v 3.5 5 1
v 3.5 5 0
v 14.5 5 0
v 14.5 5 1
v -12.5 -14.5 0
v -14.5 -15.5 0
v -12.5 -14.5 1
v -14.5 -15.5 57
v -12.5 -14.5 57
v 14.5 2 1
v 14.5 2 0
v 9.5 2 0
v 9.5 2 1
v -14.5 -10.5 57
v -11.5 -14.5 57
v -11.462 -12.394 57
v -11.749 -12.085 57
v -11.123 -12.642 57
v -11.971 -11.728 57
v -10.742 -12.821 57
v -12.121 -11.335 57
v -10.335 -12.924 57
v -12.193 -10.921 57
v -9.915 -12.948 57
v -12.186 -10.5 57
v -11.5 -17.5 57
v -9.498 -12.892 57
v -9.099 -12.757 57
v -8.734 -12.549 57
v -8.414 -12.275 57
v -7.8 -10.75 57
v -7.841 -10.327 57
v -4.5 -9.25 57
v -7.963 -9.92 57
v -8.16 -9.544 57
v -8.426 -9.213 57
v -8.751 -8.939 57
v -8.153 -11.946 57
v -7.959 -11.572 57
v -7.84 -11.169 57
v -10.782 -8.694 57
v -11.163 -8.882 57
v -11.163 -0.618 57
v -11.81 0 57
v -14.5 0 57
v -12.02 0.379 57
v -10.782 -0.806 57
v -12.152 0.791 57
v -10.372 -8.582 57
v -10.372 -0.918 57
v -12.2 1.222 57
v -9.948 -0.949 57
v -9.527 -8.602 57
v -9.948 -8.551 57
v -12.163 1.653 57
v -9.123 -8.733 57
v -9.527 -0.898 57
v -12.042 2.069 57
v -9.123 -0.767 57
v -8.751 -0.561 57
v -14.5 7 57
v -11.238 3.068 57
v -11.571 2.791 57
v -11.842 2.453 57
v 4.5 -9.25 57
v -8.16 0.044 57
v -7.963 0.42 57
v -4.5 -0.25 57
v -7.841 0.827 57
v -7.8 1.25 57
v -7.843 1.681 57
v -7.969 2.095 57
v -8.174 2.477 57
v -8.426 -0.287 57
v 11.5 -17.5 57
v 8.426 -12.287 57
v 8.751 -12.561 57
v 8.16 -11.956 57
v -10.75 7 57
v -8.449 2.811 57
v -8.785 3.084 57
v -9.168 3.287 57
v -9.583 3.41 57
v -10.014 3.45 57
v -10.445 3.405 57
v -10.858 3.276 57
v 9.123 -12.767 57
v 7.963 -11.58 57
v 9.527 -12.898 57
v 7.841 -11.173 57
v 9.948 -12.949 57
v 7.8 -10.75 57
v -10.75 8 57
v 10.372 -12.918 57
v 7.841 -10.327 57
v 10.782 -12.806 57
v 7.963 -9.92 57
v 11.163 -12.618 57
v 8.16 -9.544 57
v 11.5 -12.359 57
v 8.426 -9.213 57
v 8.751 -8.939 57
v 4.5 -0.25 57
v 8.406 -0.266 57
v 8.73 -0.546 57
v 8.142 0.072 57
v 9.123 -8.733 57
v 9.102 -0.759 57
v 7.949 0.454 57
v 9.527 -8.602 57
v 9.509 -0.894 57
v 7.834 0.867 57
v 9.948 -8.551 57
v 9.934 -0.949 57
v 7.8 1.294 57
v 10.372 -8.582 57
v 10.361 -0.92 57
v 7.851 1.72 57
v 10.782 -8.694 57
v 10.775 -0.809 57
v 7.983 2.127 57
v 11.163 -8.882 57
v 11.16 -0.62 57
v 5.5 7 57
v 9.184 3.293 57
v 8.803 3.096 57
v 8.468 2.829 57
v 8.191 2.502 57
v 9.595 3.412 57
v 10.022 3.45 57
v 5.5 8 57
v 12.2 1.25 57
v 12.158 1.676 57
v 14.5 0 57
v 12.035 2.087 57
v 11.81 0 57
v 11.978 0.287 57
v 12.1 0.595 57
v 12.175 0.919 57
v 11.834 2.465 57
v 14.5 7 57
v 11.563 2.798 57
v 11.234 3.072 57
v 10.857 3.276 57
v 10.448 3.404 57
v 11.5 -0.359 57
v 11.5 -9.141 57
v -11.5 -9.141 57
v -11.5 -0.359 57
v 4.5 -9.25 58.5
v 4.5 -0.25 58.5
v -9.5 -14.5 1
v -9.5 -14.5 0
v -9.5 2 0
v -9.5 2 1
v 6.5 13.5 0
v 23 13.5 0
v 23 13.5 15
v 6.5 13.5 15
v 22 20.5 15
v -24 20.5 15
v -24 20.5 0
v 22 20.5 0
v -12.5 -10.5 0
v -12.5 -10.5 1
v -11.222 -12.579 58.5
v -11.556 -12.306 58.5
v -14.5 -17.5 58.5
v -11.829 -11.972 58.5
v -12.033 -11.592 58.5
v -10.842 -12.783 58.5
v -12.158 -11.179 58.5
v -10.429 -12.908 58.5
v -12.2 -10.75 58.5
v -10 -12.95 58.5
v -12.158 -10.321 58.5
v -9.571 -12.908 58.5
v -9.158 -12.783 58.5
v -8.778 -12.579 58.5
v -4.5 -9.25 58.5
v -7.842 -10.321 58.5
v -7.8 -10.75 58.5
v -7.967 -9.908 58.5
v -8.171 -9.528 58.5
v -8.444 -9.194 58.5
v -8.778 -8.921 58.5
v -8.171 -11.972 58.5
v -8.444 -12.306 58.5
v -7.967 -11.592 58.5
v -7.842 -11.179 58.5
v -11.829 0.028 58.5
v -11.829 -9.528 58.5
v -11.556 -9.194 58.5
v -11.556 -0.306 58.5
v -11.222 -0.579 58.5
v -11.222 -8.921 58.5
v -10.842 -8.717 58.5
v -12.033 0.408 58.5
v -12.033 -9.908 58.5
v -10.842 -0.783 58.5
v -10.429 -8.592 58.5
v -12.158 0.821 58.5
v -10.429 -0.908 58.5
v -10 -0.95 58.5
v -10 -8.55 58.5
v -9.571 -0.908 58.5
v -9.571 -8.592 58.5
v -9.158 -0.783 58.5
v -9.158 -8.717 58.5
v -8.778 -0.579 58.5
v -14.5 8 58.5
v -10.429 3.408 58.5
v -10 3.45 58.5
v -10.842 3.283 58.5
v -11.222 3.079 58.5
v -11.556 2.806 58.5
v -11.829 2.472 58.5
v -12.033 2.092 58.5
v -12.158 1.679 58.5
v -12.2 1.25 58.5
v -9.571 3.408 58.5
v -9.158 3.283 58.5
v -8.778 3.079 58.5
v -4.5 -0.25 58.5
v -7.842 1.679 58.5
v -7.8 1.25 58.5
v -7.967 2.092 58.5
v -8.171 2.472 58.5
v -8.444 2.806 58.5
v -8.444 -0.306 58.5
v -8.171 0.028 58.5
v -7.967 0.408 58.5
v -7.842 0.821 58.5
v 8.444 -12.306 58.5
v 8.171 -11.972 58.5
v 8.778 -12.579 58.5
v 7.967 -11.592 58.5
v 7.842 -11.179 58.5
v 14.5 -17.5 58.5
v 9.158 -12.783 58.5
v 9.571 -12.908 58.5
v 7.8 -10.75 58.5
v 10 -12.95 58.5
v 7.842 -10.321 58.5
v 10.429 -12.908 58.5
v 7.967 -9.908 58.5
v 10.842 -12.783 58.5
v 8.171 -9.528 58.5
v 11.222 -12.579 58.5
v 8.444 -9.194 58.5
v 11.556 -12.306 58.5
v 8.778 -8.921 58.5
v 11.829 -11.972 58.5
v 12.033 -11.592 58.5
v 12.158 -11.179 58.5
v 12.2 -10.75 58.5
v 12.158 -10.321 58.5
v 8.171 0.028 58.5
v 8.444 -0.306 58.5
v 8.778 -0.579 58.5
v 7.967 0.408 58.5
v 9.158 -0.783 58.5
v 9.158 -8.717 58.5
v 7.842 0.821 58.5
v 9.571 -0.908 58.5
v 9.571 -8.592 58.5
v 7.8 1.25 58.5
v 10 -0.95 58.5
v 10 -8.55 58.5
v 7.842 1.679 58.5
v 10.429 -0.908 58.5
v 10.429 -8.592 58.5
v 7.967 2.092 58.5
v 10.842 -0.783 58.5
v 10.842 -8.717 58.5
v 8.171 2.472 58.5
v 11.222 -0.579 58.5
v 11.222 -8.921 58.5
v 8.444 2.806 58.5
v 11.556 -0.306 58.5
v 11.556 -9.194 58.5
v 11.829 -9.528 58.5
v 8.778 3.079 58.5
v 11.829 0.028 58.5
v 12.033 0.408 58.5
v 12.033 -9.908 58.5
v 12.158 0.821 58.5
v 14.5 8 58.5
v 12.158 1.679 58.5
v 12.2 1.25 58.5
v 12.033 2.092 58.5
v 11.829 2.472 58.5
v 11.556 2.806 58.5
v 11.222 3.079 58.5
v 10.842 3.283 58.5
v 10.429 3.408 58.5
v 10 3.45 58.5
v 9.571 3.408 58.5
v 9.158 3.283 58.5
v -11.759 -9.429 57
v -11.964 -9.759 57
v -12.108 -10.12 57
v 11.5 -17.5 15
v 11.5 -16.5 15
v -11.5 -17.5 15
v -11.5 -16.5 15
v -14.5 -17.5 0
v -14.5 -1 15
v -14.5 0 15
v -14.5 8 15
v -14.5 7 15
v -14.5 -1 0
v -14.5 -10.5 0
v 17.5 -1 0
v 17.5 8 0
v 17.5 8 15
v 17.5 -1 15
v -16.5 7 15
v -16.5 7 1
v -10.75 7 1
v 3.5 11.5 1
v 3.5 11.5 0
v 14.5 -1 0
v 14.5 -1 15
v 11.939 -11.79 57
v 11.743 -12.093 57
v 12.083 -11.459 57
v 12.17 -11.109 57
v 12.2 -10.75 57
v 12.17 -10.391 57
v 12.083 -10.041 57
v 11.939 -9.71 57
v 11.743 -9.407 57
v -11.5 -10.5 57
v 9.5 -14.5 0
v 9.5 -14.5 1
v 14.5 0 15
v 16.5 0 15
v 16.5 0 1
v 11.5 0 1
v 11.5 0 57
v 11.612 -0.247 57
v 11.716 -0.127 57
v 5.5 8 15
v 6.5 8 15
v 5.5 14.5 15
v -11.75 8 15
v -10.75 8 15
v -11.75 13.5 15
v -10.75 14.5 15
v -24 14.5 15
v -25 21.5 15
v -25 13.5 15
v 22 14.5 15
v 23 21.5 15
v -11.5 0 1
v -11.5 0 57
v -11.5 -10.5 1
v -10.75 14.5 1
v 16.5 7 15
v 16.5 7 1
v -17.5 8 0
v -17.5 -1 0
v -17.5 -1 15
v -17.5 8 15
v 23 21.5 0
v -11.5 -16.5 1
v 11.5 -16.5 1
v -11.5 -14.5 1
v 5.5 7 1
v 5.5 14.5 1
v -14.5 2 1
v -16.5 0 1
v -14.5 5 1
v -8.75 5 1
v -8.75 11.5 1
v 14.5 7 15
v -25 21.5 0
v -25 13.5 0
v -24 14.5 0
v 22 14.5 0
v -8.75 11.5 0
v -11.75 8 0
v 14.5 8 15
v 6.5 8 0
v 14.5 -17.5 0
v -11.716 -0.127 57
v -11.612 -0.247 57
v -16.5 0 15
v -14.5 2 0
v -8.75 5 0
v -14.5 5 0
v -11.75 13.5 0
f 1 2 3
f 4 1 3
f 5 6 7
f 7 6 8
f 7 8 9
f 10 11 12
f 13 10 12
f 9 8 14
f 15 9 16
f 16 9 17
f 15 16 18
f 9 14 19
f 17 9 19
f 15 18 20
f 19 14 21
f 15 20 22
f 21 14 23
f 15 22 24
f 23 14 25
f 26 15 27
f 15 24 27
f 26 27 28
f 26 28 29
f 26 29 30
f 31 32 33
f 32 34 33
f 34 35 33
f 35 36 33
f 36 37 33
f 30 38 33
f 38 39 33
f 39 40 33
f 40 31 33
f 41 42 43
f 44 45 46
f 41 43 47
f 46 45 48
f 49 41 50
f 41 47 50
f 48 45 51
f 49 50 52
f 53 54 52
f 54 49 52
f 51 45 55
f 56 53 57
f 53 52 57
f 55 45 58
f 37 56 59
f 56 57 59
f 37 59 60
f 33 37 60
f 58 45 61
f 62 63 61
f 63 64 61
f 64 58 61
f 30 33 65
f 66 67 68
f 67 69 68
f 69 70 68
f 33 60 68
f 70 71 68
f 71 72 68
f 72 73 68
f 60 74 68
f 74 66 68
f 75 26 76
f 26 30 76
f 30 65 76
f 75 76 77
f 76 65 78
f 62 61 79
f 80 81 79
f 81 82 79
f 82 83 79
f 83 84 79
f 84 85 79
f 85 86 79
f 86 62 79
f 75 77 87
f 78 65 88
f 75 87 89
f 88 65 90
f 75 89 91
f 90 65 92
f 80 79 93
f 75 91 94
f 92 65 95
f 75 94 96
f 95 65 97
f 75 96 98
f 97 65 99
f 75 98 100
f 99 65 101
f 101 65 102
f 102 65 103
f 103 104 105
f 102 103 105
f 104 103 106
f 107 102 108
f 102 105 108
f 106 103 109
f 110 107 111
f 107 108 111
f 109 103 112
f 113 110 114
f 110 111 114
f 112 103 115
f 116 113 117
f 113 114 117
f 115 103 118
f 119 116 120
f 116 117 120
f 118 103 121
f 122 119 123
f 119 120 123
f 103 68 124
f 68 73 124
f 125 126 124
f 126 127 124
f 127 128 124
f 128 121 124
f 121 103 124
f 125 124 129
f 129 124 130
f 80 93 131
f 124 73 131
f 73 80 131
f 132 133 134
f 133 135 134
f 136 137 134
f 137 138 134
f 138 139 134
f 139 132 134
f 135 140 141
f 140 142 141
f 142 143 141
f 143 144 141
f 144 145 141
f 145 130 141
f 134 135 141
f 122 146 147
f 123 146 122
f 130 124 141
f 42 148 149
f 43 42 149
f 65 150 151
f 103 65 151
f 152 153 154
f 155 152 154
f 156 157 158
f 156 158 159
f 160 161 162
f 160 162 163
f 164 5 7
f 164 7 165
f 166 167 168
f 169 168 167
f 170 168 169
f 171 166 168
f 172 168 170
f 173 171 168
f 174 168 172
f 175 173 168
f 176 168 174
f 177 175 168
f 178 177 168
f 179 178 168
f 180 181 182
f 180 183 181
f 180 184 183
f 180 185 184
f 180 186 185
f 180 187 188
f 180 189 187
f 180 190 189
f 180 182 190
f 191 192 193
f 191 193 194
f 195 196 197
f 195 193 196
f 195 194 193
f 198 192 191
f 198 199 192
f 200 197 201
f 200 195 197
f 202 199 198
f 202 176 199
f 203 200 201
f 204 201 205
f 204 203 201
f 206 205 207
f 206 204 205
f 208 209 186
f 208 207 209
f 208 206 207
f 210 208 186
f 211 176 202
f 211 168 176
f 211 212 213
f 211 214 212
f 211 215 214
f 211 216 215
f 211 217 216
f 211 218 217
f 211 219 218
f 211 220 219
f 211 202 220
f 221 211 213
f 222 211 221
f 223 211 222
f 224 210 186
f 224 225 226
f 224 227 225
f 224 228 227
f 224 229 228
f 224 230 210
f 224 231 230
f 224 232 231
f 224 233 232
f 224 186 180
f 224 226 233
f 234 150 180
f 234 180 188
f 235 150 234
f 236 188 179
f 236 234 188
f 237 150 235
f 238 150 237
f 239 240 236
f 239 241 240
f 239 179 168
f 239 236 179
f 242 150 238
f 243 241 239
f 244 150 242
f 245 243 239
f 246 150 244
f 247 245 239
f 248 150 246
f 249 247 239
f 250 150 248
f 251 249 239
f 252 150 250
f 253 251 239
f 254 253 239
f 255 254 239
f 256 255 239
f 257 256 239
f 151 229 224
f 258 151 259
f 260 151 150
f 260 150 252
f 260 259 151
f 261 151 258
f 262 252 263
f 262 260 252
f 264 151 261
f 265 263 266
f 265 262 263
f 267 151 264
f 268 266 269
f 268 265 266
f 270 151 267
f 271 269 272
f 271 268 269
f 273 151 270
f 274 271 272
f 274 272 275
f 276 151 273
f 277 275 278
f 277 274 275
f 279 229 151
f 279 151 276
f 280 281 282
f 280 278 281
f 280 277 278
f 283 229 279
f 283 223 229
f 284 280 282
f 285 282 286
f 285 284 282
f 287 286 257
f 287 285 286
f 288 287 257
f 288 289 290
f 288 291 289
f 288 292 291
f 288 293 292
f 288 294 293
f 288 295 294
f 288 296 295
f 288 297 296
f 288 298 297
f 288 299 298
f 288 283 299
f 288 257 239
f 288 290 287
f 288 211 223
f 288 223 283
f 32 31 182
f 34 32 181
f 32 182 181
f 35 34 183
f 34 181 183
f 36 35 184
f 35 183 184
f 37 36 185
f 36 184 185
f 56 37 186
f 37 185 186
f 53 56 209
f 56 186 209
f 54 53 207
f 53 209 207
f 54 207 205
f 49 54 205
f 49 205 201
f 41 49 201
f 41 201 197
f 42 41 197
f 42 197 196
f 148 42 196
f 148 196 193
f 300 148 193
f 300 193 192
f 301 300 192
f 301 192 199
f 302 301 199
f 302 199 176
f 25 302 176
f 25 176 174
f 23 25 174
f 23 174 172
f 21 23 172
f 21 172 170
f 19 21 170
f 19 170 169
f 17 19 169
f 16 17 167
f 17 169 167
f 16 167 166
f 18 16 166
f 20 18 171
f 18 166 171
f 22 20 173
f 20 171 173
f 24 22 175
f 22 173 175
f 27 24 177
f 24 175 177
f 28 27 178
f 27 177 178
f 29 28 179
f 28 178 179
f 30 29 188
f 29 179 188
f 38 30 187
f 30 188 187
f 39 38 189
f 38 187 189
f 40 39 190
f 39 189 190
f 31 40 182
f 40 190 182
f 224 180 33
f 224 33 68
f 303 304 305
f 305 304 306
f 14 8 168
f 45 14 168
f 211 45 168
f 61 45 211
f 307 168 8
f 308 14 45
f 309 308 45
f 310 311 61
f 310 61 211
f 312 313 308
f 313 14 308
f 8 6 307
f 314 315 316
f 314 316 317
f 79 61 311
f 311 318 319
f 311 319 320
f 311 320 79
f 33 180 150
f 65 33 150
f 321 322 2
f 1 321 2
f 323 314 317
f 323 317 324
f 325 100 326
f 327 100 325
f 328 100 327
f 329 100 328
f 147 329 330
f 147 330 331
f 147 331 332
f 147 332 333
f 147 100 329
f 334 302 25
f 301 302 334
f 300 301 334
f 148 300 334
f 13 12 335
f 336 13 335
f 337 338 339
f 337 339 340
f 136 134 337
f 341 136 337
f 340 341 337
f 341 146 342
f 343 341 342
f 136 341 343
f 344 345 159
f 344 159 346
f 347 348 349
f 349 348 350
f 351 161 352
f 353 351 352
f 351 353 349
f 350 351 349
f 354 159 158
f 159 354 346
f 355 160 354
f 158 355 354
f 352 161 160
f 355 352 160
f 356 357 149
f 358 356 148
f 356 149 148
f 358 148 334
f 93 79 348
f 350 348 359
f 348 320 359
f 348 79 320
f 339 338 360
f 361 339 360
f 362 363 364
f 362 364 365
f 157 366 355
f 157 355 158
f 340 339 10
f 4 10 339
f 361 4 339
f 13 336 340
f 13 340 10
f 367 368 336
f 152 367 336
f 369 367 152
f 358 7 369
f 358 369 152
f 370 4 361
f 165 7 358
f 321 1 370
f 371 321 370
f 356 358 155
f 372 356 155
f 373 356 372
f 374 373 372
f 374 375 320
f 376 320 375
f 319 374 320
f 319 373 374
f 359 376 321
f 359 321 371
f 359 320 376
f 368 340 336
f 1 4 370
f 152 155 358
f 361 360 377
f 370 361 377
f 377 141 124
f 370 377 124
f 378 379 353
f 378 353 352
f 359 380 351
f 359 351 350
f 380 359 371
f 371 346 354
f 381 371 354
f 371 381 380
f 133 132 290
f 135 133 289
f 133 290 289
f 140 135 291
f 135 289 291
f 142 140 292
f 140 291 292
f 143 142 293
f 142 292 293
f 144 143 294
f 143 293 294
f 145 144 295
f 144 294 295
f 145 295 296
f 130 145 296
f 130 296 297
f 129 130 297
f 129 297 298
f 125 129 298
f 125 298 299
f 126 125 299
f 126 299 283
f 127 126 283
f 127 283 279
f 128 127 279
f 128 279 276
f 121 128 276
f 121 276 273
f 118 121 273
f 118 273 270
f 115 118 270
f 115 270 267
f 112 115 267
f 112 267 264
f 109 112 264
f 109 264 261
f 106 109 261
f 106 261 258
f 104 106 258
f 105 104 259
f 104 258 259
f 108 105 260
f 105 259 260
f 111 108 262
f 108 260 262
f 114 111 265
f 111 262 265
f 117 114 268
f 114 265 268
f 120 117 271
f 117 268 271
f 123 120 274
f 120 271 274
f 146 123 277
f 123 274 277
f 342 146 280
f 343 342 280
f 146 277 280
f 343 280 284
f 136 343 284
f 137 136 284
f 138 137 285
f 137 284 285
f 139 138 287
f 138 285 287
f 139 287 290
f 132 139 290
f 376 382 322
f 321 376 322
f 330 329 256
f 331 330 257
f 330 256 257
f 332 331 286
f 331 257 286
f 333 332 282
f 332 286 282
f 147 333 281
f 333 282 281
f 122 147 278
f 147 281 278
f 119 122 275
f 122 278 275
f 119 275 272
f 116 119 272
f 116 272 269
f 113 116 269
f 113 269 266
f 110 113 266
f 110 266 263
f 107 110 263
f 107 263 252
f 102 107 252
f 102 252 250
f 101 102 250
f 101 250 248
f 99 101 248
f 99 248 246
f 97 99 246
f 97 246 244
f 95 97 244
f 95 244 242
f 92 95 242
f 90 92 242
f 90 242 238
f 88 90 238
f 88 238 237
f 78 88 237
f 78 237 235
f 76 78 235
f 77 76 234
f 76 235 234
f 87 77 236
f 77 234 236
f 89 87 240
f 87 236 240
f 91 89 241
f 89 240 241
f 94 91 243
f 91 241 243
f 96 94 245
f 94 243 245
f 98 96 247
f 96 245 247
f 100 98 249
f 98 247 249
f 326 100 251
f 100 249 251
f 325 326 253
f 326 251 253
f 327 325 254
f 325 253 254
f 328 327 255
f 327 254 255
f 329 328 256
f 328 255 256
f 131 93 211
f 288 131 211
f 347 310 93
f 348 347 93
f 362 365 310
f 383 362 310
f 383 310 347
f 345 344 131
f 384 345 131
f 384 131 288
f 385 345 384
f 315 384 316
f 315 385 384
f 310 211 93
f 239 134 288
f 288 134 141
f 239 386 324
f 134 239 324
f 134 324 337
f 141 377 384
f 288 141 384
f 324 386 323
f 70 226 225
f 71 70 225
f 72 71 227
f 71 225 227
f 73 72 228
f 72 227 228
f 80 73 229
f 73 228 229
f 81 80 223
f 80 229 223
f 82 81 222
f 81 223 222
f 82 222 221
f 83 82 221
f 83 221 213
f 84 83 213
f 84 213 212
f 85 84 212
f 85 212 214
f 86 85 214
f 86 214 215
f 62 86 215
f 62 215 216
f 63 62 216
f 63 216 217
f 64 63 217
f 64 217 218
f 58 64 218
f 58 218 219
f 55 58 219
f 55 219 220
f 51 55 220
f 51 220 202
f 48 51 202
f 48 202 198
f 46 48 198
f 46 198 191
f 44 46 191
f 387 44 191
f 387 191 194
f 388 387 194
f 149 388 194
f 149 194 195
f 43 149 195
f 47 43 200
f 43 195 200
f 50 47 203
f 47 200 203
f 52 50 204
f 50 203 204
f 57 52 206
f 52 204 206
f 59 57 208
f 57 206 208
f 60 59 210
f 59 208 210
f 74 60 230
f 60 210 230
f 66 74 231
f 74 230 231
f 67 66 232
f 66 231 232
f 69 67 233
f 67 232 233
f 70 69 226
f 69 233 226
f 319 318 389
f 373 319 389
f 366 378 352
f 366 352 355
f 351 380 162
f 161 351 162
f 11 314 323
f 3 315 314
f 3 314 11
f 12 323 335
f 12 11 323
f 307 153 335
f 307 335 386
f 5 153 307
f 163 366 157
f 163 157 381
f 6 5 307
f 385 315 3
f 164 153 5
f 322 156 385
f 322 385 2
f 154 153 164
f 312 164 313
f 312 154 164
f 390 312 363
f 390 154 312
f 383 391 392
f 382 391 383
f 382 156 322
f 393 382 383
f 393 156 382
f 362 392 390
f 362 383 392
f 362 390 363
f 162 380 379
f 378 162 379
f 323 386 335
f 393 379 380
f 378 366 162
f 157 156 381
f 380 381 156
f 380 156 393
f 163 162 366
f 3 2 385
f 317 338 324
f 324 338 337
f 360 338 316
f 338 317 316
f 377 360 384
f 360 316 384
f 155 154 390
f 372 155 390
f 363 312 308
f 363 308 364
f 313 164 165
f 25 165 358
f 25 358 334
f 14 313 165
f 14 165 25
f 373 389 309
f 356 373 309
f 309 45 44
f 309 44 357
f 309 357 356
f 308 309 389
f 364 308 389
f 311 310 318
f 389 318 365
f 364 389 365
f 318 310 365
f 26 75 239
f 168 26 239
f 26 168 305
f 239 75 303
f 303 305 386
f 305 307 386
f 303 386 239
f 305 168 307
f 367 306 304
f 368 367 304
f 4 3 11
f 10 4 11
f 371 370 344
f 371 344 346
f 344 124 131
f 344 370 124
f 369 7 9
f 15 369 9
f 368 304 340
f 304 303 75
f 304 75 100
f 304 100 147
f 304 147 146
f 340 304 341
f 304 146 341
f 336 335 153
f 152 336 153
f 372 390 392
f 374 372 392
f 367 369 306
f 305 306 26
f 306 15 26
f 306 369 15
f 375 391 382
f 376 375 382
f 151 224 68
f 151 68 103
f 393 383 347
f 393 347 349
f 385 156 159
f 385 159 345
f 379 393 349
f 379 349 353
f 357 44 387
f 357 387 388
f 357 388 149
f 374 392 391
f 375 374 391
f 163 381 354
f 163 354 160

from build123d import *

# Parameters (mm, degrees)
EXTRUDE_1_DEPTH        = 15
CUT_EXTRUDE_1_DEPTH    = 14
SKETCH_7_W             = 46
SKETCH_7_H             = 6
CUT_EXTRUDE_2_DEPTH    = 1
SKETCH_8_W             = 14
SKETCH_8_H             = 4
CUT_EXTRUDE_3_DEPTH    = 1
CUT_EXTRUDE_6_DEPTH    = 1
EXTRUDE_START          = -57
EXTRUDE_10_OUTLINE_W   = 3
EXTRUDE_10_OUTLINE_H   = 17.5
EXTRUDE_10_OUTLINE_H_2 = 10.5
EXTRUDE_10_OUTLINE_W_2 = 9
EXTRUDE_10_OUTLINE_H_3 = 1
EXTRUDE_10_OUTLINE_W_3 = 2
EXTRUDE_10_DEPTH       = 57
SKETCH_29_W            = 29
SKETCH_29_H            = 25.5
EXTRUDE_12_DEPTH       = 1.5
SKETCH_30_R            = 2.2
SKETCH_30_W            = 9
SKETCH_30_H            = 9
CUT_EXTRUDE_8_DEPTH    = 1.5
SKETCH_31_W            = 1.75
SKETCH_31_H            = 1
EXTRUDE_13_DEPTH       = 42


# Read off the part's stored shape, not the designer's step: 凸台-拉伸10
with BuildPart() as part:
    # 草图3 → 凸台-拉伸1 (new body)
    with BuildSketch(Plane.XY):
        Polygon((-25, 21.5), (23, 21.5), (23, 13.5), (6.5, 13.5), (6.5, 8), (17.5, 8), (17.5, -1), (12.5, -1), (12.5, -17.5), (-12.5, -17.5), (-12.5, -1), (-17.5, -1), (-17.5, 8), (-11.75, 8), (-11.75, 13.5), (-25, 13.5), align=None)
    extrude(amount=EXTRUDE_1_DEPTH)

    # 草图4 → 切除-拉伸1 (cut)
    with BuildSketch(Plane.XY.offset(15)):
        Polygon((22, 20.5), (-24, 20.5), (-24, 14.5), (-10.75, 14.5), (-10.75, 7), (-16.5, 7), (-16.5, 0), (-11.5, 0), (-11.5, -16.5), (11.5, -16.5), (11.5, 0), (16.5, 0), (16.5, 7), (5.5, 7), (5.5, 14.5), (22, 14.5), align=None)
    extrude(amount=-CUT_EXTRUDE_1_DEPTH, mode=Mode.SUBTRACT)

    # 草图7 → 切除-拉伸2 (cut)
    with BuildSketch(Plane.XY.offset(1)):
        with Locations((-1, 17.5)):
            Rectangle(SKETCH_7_W, SKETCH_7_H)
    extrude(amount=-CUT_EXTRUDE_2_DEPTH, mode=Mode.SUBTRACT)

    # 草图8 → 切除-拉伸3 (cut)
    with BuildSketch(Plane.ZY.offset(12.5)):
        with Locations((8, -12.5)):
            Rectangle(SKETCH_8_W, SKETCH_8_H)
    extrude(amount=-CUT_EXTRUDE_3_DEPTH, mode=Mode.SUBTRACT)

    # 草图9 → 切除-拉伸6 (cut)
    with BuildSketch(Plane(origin=(0, 0, 0), x_dir=(-1, 0, 0), z_dir=(0, 0, -1))):
        Polygon((-3.5, 11.5), (-3.5, 5), (-14.5, 5), (-14.5, 2), (-9.5, 2), (-9.5, -14.5), (9.5, -14.5), (9.5, 2), (14.5, 2), (14.5, 5), (8.75, 5), (8.75, 11.5), align=None)
    extrude(amount=-CUT_EXTRUDE_6_DEPTH, mode=Mode.SUBTRACT)

    # 凸台-拉伸10 outline → 凸台-拉伸10 (add)
    with BuildSketch(Plane(origin=(0, 0, 0), x_dir=(-1, 0, 0), z_dir=(0, 0, -1)).offset(EXTRUDE_START)):
        with Locations((-13, -8.75)):
            Rectangle(EXTRUDE_10_OUTLINE_W, EXTRUDE_10_OUTLINE_H)
        Polygon((14.5, -15.5), (12.5, -14.5), (11.5, -14.5), (11.5, -17.5), (14.5, -17.5), align=None)
        with Locations((13, -5.25)):
            Rectangle(EXTRUDE_10_OUTLINE_W, EXTRUDE_10_OUTLINE_H_2)
        with Locations((-10, 7.5)):
            Rectangle(EXTRUDE_10_OUTLINE_W_2, EXTRUDE_10_OUTLINE_H_3)
        with Locations((13.5, 7.5)):
            Rectangle(EXTRUDE_10_OUTLINE_W_3, EXTRUDE_10_OUTLINE_H_3)
    extrude(amount=EXTRUDE_10_DEPTH)

    # 草图29 → 凸台-拉伸12 (add)
    with BuildSketch(Plane.XY.offset(57)):
        with Locations((0, -4.75)):
            Rectangle(SKETCH_29_W, SKETCH_29_H)
    extrude(amount=EXTRUDE_12_DEPTH)

    # 草图30 → 切除-拉伸8 (cut)
    with BuildSketch(Plane.XY.offset(58.5)):
        with Locations((-10, 1.25)):
            Circle(SKETCH_30_R)
        with Locations((-10, -10.75)):
            Circle(SKETCH_30_R)
        with Locations((10, 1.25)):
            Circle(SKETCH_30_R)
        with Locations((10, -10.75)):
            Circle(SKETCH_30_R)
        with Locations((0, -4.75)):
            Rectangle(SKETCH_30_W, SKETCH_30_H)
    extrude(amount=-CUT_EXTRUDE_8_DEPTH, mode=Mode.SUBTRACT)

    # 草图31 → 凸台-拉伸13 (add)
    with BuildSketch(Plane.XY.offset(15)):
        with Locations((-11.625, 7.5)):
            Rectangle(SKETCH_31_W, SKETCH_31_H)
    extrude(amount=EXTRUDE_13_DEPTH)


solid = part.part
